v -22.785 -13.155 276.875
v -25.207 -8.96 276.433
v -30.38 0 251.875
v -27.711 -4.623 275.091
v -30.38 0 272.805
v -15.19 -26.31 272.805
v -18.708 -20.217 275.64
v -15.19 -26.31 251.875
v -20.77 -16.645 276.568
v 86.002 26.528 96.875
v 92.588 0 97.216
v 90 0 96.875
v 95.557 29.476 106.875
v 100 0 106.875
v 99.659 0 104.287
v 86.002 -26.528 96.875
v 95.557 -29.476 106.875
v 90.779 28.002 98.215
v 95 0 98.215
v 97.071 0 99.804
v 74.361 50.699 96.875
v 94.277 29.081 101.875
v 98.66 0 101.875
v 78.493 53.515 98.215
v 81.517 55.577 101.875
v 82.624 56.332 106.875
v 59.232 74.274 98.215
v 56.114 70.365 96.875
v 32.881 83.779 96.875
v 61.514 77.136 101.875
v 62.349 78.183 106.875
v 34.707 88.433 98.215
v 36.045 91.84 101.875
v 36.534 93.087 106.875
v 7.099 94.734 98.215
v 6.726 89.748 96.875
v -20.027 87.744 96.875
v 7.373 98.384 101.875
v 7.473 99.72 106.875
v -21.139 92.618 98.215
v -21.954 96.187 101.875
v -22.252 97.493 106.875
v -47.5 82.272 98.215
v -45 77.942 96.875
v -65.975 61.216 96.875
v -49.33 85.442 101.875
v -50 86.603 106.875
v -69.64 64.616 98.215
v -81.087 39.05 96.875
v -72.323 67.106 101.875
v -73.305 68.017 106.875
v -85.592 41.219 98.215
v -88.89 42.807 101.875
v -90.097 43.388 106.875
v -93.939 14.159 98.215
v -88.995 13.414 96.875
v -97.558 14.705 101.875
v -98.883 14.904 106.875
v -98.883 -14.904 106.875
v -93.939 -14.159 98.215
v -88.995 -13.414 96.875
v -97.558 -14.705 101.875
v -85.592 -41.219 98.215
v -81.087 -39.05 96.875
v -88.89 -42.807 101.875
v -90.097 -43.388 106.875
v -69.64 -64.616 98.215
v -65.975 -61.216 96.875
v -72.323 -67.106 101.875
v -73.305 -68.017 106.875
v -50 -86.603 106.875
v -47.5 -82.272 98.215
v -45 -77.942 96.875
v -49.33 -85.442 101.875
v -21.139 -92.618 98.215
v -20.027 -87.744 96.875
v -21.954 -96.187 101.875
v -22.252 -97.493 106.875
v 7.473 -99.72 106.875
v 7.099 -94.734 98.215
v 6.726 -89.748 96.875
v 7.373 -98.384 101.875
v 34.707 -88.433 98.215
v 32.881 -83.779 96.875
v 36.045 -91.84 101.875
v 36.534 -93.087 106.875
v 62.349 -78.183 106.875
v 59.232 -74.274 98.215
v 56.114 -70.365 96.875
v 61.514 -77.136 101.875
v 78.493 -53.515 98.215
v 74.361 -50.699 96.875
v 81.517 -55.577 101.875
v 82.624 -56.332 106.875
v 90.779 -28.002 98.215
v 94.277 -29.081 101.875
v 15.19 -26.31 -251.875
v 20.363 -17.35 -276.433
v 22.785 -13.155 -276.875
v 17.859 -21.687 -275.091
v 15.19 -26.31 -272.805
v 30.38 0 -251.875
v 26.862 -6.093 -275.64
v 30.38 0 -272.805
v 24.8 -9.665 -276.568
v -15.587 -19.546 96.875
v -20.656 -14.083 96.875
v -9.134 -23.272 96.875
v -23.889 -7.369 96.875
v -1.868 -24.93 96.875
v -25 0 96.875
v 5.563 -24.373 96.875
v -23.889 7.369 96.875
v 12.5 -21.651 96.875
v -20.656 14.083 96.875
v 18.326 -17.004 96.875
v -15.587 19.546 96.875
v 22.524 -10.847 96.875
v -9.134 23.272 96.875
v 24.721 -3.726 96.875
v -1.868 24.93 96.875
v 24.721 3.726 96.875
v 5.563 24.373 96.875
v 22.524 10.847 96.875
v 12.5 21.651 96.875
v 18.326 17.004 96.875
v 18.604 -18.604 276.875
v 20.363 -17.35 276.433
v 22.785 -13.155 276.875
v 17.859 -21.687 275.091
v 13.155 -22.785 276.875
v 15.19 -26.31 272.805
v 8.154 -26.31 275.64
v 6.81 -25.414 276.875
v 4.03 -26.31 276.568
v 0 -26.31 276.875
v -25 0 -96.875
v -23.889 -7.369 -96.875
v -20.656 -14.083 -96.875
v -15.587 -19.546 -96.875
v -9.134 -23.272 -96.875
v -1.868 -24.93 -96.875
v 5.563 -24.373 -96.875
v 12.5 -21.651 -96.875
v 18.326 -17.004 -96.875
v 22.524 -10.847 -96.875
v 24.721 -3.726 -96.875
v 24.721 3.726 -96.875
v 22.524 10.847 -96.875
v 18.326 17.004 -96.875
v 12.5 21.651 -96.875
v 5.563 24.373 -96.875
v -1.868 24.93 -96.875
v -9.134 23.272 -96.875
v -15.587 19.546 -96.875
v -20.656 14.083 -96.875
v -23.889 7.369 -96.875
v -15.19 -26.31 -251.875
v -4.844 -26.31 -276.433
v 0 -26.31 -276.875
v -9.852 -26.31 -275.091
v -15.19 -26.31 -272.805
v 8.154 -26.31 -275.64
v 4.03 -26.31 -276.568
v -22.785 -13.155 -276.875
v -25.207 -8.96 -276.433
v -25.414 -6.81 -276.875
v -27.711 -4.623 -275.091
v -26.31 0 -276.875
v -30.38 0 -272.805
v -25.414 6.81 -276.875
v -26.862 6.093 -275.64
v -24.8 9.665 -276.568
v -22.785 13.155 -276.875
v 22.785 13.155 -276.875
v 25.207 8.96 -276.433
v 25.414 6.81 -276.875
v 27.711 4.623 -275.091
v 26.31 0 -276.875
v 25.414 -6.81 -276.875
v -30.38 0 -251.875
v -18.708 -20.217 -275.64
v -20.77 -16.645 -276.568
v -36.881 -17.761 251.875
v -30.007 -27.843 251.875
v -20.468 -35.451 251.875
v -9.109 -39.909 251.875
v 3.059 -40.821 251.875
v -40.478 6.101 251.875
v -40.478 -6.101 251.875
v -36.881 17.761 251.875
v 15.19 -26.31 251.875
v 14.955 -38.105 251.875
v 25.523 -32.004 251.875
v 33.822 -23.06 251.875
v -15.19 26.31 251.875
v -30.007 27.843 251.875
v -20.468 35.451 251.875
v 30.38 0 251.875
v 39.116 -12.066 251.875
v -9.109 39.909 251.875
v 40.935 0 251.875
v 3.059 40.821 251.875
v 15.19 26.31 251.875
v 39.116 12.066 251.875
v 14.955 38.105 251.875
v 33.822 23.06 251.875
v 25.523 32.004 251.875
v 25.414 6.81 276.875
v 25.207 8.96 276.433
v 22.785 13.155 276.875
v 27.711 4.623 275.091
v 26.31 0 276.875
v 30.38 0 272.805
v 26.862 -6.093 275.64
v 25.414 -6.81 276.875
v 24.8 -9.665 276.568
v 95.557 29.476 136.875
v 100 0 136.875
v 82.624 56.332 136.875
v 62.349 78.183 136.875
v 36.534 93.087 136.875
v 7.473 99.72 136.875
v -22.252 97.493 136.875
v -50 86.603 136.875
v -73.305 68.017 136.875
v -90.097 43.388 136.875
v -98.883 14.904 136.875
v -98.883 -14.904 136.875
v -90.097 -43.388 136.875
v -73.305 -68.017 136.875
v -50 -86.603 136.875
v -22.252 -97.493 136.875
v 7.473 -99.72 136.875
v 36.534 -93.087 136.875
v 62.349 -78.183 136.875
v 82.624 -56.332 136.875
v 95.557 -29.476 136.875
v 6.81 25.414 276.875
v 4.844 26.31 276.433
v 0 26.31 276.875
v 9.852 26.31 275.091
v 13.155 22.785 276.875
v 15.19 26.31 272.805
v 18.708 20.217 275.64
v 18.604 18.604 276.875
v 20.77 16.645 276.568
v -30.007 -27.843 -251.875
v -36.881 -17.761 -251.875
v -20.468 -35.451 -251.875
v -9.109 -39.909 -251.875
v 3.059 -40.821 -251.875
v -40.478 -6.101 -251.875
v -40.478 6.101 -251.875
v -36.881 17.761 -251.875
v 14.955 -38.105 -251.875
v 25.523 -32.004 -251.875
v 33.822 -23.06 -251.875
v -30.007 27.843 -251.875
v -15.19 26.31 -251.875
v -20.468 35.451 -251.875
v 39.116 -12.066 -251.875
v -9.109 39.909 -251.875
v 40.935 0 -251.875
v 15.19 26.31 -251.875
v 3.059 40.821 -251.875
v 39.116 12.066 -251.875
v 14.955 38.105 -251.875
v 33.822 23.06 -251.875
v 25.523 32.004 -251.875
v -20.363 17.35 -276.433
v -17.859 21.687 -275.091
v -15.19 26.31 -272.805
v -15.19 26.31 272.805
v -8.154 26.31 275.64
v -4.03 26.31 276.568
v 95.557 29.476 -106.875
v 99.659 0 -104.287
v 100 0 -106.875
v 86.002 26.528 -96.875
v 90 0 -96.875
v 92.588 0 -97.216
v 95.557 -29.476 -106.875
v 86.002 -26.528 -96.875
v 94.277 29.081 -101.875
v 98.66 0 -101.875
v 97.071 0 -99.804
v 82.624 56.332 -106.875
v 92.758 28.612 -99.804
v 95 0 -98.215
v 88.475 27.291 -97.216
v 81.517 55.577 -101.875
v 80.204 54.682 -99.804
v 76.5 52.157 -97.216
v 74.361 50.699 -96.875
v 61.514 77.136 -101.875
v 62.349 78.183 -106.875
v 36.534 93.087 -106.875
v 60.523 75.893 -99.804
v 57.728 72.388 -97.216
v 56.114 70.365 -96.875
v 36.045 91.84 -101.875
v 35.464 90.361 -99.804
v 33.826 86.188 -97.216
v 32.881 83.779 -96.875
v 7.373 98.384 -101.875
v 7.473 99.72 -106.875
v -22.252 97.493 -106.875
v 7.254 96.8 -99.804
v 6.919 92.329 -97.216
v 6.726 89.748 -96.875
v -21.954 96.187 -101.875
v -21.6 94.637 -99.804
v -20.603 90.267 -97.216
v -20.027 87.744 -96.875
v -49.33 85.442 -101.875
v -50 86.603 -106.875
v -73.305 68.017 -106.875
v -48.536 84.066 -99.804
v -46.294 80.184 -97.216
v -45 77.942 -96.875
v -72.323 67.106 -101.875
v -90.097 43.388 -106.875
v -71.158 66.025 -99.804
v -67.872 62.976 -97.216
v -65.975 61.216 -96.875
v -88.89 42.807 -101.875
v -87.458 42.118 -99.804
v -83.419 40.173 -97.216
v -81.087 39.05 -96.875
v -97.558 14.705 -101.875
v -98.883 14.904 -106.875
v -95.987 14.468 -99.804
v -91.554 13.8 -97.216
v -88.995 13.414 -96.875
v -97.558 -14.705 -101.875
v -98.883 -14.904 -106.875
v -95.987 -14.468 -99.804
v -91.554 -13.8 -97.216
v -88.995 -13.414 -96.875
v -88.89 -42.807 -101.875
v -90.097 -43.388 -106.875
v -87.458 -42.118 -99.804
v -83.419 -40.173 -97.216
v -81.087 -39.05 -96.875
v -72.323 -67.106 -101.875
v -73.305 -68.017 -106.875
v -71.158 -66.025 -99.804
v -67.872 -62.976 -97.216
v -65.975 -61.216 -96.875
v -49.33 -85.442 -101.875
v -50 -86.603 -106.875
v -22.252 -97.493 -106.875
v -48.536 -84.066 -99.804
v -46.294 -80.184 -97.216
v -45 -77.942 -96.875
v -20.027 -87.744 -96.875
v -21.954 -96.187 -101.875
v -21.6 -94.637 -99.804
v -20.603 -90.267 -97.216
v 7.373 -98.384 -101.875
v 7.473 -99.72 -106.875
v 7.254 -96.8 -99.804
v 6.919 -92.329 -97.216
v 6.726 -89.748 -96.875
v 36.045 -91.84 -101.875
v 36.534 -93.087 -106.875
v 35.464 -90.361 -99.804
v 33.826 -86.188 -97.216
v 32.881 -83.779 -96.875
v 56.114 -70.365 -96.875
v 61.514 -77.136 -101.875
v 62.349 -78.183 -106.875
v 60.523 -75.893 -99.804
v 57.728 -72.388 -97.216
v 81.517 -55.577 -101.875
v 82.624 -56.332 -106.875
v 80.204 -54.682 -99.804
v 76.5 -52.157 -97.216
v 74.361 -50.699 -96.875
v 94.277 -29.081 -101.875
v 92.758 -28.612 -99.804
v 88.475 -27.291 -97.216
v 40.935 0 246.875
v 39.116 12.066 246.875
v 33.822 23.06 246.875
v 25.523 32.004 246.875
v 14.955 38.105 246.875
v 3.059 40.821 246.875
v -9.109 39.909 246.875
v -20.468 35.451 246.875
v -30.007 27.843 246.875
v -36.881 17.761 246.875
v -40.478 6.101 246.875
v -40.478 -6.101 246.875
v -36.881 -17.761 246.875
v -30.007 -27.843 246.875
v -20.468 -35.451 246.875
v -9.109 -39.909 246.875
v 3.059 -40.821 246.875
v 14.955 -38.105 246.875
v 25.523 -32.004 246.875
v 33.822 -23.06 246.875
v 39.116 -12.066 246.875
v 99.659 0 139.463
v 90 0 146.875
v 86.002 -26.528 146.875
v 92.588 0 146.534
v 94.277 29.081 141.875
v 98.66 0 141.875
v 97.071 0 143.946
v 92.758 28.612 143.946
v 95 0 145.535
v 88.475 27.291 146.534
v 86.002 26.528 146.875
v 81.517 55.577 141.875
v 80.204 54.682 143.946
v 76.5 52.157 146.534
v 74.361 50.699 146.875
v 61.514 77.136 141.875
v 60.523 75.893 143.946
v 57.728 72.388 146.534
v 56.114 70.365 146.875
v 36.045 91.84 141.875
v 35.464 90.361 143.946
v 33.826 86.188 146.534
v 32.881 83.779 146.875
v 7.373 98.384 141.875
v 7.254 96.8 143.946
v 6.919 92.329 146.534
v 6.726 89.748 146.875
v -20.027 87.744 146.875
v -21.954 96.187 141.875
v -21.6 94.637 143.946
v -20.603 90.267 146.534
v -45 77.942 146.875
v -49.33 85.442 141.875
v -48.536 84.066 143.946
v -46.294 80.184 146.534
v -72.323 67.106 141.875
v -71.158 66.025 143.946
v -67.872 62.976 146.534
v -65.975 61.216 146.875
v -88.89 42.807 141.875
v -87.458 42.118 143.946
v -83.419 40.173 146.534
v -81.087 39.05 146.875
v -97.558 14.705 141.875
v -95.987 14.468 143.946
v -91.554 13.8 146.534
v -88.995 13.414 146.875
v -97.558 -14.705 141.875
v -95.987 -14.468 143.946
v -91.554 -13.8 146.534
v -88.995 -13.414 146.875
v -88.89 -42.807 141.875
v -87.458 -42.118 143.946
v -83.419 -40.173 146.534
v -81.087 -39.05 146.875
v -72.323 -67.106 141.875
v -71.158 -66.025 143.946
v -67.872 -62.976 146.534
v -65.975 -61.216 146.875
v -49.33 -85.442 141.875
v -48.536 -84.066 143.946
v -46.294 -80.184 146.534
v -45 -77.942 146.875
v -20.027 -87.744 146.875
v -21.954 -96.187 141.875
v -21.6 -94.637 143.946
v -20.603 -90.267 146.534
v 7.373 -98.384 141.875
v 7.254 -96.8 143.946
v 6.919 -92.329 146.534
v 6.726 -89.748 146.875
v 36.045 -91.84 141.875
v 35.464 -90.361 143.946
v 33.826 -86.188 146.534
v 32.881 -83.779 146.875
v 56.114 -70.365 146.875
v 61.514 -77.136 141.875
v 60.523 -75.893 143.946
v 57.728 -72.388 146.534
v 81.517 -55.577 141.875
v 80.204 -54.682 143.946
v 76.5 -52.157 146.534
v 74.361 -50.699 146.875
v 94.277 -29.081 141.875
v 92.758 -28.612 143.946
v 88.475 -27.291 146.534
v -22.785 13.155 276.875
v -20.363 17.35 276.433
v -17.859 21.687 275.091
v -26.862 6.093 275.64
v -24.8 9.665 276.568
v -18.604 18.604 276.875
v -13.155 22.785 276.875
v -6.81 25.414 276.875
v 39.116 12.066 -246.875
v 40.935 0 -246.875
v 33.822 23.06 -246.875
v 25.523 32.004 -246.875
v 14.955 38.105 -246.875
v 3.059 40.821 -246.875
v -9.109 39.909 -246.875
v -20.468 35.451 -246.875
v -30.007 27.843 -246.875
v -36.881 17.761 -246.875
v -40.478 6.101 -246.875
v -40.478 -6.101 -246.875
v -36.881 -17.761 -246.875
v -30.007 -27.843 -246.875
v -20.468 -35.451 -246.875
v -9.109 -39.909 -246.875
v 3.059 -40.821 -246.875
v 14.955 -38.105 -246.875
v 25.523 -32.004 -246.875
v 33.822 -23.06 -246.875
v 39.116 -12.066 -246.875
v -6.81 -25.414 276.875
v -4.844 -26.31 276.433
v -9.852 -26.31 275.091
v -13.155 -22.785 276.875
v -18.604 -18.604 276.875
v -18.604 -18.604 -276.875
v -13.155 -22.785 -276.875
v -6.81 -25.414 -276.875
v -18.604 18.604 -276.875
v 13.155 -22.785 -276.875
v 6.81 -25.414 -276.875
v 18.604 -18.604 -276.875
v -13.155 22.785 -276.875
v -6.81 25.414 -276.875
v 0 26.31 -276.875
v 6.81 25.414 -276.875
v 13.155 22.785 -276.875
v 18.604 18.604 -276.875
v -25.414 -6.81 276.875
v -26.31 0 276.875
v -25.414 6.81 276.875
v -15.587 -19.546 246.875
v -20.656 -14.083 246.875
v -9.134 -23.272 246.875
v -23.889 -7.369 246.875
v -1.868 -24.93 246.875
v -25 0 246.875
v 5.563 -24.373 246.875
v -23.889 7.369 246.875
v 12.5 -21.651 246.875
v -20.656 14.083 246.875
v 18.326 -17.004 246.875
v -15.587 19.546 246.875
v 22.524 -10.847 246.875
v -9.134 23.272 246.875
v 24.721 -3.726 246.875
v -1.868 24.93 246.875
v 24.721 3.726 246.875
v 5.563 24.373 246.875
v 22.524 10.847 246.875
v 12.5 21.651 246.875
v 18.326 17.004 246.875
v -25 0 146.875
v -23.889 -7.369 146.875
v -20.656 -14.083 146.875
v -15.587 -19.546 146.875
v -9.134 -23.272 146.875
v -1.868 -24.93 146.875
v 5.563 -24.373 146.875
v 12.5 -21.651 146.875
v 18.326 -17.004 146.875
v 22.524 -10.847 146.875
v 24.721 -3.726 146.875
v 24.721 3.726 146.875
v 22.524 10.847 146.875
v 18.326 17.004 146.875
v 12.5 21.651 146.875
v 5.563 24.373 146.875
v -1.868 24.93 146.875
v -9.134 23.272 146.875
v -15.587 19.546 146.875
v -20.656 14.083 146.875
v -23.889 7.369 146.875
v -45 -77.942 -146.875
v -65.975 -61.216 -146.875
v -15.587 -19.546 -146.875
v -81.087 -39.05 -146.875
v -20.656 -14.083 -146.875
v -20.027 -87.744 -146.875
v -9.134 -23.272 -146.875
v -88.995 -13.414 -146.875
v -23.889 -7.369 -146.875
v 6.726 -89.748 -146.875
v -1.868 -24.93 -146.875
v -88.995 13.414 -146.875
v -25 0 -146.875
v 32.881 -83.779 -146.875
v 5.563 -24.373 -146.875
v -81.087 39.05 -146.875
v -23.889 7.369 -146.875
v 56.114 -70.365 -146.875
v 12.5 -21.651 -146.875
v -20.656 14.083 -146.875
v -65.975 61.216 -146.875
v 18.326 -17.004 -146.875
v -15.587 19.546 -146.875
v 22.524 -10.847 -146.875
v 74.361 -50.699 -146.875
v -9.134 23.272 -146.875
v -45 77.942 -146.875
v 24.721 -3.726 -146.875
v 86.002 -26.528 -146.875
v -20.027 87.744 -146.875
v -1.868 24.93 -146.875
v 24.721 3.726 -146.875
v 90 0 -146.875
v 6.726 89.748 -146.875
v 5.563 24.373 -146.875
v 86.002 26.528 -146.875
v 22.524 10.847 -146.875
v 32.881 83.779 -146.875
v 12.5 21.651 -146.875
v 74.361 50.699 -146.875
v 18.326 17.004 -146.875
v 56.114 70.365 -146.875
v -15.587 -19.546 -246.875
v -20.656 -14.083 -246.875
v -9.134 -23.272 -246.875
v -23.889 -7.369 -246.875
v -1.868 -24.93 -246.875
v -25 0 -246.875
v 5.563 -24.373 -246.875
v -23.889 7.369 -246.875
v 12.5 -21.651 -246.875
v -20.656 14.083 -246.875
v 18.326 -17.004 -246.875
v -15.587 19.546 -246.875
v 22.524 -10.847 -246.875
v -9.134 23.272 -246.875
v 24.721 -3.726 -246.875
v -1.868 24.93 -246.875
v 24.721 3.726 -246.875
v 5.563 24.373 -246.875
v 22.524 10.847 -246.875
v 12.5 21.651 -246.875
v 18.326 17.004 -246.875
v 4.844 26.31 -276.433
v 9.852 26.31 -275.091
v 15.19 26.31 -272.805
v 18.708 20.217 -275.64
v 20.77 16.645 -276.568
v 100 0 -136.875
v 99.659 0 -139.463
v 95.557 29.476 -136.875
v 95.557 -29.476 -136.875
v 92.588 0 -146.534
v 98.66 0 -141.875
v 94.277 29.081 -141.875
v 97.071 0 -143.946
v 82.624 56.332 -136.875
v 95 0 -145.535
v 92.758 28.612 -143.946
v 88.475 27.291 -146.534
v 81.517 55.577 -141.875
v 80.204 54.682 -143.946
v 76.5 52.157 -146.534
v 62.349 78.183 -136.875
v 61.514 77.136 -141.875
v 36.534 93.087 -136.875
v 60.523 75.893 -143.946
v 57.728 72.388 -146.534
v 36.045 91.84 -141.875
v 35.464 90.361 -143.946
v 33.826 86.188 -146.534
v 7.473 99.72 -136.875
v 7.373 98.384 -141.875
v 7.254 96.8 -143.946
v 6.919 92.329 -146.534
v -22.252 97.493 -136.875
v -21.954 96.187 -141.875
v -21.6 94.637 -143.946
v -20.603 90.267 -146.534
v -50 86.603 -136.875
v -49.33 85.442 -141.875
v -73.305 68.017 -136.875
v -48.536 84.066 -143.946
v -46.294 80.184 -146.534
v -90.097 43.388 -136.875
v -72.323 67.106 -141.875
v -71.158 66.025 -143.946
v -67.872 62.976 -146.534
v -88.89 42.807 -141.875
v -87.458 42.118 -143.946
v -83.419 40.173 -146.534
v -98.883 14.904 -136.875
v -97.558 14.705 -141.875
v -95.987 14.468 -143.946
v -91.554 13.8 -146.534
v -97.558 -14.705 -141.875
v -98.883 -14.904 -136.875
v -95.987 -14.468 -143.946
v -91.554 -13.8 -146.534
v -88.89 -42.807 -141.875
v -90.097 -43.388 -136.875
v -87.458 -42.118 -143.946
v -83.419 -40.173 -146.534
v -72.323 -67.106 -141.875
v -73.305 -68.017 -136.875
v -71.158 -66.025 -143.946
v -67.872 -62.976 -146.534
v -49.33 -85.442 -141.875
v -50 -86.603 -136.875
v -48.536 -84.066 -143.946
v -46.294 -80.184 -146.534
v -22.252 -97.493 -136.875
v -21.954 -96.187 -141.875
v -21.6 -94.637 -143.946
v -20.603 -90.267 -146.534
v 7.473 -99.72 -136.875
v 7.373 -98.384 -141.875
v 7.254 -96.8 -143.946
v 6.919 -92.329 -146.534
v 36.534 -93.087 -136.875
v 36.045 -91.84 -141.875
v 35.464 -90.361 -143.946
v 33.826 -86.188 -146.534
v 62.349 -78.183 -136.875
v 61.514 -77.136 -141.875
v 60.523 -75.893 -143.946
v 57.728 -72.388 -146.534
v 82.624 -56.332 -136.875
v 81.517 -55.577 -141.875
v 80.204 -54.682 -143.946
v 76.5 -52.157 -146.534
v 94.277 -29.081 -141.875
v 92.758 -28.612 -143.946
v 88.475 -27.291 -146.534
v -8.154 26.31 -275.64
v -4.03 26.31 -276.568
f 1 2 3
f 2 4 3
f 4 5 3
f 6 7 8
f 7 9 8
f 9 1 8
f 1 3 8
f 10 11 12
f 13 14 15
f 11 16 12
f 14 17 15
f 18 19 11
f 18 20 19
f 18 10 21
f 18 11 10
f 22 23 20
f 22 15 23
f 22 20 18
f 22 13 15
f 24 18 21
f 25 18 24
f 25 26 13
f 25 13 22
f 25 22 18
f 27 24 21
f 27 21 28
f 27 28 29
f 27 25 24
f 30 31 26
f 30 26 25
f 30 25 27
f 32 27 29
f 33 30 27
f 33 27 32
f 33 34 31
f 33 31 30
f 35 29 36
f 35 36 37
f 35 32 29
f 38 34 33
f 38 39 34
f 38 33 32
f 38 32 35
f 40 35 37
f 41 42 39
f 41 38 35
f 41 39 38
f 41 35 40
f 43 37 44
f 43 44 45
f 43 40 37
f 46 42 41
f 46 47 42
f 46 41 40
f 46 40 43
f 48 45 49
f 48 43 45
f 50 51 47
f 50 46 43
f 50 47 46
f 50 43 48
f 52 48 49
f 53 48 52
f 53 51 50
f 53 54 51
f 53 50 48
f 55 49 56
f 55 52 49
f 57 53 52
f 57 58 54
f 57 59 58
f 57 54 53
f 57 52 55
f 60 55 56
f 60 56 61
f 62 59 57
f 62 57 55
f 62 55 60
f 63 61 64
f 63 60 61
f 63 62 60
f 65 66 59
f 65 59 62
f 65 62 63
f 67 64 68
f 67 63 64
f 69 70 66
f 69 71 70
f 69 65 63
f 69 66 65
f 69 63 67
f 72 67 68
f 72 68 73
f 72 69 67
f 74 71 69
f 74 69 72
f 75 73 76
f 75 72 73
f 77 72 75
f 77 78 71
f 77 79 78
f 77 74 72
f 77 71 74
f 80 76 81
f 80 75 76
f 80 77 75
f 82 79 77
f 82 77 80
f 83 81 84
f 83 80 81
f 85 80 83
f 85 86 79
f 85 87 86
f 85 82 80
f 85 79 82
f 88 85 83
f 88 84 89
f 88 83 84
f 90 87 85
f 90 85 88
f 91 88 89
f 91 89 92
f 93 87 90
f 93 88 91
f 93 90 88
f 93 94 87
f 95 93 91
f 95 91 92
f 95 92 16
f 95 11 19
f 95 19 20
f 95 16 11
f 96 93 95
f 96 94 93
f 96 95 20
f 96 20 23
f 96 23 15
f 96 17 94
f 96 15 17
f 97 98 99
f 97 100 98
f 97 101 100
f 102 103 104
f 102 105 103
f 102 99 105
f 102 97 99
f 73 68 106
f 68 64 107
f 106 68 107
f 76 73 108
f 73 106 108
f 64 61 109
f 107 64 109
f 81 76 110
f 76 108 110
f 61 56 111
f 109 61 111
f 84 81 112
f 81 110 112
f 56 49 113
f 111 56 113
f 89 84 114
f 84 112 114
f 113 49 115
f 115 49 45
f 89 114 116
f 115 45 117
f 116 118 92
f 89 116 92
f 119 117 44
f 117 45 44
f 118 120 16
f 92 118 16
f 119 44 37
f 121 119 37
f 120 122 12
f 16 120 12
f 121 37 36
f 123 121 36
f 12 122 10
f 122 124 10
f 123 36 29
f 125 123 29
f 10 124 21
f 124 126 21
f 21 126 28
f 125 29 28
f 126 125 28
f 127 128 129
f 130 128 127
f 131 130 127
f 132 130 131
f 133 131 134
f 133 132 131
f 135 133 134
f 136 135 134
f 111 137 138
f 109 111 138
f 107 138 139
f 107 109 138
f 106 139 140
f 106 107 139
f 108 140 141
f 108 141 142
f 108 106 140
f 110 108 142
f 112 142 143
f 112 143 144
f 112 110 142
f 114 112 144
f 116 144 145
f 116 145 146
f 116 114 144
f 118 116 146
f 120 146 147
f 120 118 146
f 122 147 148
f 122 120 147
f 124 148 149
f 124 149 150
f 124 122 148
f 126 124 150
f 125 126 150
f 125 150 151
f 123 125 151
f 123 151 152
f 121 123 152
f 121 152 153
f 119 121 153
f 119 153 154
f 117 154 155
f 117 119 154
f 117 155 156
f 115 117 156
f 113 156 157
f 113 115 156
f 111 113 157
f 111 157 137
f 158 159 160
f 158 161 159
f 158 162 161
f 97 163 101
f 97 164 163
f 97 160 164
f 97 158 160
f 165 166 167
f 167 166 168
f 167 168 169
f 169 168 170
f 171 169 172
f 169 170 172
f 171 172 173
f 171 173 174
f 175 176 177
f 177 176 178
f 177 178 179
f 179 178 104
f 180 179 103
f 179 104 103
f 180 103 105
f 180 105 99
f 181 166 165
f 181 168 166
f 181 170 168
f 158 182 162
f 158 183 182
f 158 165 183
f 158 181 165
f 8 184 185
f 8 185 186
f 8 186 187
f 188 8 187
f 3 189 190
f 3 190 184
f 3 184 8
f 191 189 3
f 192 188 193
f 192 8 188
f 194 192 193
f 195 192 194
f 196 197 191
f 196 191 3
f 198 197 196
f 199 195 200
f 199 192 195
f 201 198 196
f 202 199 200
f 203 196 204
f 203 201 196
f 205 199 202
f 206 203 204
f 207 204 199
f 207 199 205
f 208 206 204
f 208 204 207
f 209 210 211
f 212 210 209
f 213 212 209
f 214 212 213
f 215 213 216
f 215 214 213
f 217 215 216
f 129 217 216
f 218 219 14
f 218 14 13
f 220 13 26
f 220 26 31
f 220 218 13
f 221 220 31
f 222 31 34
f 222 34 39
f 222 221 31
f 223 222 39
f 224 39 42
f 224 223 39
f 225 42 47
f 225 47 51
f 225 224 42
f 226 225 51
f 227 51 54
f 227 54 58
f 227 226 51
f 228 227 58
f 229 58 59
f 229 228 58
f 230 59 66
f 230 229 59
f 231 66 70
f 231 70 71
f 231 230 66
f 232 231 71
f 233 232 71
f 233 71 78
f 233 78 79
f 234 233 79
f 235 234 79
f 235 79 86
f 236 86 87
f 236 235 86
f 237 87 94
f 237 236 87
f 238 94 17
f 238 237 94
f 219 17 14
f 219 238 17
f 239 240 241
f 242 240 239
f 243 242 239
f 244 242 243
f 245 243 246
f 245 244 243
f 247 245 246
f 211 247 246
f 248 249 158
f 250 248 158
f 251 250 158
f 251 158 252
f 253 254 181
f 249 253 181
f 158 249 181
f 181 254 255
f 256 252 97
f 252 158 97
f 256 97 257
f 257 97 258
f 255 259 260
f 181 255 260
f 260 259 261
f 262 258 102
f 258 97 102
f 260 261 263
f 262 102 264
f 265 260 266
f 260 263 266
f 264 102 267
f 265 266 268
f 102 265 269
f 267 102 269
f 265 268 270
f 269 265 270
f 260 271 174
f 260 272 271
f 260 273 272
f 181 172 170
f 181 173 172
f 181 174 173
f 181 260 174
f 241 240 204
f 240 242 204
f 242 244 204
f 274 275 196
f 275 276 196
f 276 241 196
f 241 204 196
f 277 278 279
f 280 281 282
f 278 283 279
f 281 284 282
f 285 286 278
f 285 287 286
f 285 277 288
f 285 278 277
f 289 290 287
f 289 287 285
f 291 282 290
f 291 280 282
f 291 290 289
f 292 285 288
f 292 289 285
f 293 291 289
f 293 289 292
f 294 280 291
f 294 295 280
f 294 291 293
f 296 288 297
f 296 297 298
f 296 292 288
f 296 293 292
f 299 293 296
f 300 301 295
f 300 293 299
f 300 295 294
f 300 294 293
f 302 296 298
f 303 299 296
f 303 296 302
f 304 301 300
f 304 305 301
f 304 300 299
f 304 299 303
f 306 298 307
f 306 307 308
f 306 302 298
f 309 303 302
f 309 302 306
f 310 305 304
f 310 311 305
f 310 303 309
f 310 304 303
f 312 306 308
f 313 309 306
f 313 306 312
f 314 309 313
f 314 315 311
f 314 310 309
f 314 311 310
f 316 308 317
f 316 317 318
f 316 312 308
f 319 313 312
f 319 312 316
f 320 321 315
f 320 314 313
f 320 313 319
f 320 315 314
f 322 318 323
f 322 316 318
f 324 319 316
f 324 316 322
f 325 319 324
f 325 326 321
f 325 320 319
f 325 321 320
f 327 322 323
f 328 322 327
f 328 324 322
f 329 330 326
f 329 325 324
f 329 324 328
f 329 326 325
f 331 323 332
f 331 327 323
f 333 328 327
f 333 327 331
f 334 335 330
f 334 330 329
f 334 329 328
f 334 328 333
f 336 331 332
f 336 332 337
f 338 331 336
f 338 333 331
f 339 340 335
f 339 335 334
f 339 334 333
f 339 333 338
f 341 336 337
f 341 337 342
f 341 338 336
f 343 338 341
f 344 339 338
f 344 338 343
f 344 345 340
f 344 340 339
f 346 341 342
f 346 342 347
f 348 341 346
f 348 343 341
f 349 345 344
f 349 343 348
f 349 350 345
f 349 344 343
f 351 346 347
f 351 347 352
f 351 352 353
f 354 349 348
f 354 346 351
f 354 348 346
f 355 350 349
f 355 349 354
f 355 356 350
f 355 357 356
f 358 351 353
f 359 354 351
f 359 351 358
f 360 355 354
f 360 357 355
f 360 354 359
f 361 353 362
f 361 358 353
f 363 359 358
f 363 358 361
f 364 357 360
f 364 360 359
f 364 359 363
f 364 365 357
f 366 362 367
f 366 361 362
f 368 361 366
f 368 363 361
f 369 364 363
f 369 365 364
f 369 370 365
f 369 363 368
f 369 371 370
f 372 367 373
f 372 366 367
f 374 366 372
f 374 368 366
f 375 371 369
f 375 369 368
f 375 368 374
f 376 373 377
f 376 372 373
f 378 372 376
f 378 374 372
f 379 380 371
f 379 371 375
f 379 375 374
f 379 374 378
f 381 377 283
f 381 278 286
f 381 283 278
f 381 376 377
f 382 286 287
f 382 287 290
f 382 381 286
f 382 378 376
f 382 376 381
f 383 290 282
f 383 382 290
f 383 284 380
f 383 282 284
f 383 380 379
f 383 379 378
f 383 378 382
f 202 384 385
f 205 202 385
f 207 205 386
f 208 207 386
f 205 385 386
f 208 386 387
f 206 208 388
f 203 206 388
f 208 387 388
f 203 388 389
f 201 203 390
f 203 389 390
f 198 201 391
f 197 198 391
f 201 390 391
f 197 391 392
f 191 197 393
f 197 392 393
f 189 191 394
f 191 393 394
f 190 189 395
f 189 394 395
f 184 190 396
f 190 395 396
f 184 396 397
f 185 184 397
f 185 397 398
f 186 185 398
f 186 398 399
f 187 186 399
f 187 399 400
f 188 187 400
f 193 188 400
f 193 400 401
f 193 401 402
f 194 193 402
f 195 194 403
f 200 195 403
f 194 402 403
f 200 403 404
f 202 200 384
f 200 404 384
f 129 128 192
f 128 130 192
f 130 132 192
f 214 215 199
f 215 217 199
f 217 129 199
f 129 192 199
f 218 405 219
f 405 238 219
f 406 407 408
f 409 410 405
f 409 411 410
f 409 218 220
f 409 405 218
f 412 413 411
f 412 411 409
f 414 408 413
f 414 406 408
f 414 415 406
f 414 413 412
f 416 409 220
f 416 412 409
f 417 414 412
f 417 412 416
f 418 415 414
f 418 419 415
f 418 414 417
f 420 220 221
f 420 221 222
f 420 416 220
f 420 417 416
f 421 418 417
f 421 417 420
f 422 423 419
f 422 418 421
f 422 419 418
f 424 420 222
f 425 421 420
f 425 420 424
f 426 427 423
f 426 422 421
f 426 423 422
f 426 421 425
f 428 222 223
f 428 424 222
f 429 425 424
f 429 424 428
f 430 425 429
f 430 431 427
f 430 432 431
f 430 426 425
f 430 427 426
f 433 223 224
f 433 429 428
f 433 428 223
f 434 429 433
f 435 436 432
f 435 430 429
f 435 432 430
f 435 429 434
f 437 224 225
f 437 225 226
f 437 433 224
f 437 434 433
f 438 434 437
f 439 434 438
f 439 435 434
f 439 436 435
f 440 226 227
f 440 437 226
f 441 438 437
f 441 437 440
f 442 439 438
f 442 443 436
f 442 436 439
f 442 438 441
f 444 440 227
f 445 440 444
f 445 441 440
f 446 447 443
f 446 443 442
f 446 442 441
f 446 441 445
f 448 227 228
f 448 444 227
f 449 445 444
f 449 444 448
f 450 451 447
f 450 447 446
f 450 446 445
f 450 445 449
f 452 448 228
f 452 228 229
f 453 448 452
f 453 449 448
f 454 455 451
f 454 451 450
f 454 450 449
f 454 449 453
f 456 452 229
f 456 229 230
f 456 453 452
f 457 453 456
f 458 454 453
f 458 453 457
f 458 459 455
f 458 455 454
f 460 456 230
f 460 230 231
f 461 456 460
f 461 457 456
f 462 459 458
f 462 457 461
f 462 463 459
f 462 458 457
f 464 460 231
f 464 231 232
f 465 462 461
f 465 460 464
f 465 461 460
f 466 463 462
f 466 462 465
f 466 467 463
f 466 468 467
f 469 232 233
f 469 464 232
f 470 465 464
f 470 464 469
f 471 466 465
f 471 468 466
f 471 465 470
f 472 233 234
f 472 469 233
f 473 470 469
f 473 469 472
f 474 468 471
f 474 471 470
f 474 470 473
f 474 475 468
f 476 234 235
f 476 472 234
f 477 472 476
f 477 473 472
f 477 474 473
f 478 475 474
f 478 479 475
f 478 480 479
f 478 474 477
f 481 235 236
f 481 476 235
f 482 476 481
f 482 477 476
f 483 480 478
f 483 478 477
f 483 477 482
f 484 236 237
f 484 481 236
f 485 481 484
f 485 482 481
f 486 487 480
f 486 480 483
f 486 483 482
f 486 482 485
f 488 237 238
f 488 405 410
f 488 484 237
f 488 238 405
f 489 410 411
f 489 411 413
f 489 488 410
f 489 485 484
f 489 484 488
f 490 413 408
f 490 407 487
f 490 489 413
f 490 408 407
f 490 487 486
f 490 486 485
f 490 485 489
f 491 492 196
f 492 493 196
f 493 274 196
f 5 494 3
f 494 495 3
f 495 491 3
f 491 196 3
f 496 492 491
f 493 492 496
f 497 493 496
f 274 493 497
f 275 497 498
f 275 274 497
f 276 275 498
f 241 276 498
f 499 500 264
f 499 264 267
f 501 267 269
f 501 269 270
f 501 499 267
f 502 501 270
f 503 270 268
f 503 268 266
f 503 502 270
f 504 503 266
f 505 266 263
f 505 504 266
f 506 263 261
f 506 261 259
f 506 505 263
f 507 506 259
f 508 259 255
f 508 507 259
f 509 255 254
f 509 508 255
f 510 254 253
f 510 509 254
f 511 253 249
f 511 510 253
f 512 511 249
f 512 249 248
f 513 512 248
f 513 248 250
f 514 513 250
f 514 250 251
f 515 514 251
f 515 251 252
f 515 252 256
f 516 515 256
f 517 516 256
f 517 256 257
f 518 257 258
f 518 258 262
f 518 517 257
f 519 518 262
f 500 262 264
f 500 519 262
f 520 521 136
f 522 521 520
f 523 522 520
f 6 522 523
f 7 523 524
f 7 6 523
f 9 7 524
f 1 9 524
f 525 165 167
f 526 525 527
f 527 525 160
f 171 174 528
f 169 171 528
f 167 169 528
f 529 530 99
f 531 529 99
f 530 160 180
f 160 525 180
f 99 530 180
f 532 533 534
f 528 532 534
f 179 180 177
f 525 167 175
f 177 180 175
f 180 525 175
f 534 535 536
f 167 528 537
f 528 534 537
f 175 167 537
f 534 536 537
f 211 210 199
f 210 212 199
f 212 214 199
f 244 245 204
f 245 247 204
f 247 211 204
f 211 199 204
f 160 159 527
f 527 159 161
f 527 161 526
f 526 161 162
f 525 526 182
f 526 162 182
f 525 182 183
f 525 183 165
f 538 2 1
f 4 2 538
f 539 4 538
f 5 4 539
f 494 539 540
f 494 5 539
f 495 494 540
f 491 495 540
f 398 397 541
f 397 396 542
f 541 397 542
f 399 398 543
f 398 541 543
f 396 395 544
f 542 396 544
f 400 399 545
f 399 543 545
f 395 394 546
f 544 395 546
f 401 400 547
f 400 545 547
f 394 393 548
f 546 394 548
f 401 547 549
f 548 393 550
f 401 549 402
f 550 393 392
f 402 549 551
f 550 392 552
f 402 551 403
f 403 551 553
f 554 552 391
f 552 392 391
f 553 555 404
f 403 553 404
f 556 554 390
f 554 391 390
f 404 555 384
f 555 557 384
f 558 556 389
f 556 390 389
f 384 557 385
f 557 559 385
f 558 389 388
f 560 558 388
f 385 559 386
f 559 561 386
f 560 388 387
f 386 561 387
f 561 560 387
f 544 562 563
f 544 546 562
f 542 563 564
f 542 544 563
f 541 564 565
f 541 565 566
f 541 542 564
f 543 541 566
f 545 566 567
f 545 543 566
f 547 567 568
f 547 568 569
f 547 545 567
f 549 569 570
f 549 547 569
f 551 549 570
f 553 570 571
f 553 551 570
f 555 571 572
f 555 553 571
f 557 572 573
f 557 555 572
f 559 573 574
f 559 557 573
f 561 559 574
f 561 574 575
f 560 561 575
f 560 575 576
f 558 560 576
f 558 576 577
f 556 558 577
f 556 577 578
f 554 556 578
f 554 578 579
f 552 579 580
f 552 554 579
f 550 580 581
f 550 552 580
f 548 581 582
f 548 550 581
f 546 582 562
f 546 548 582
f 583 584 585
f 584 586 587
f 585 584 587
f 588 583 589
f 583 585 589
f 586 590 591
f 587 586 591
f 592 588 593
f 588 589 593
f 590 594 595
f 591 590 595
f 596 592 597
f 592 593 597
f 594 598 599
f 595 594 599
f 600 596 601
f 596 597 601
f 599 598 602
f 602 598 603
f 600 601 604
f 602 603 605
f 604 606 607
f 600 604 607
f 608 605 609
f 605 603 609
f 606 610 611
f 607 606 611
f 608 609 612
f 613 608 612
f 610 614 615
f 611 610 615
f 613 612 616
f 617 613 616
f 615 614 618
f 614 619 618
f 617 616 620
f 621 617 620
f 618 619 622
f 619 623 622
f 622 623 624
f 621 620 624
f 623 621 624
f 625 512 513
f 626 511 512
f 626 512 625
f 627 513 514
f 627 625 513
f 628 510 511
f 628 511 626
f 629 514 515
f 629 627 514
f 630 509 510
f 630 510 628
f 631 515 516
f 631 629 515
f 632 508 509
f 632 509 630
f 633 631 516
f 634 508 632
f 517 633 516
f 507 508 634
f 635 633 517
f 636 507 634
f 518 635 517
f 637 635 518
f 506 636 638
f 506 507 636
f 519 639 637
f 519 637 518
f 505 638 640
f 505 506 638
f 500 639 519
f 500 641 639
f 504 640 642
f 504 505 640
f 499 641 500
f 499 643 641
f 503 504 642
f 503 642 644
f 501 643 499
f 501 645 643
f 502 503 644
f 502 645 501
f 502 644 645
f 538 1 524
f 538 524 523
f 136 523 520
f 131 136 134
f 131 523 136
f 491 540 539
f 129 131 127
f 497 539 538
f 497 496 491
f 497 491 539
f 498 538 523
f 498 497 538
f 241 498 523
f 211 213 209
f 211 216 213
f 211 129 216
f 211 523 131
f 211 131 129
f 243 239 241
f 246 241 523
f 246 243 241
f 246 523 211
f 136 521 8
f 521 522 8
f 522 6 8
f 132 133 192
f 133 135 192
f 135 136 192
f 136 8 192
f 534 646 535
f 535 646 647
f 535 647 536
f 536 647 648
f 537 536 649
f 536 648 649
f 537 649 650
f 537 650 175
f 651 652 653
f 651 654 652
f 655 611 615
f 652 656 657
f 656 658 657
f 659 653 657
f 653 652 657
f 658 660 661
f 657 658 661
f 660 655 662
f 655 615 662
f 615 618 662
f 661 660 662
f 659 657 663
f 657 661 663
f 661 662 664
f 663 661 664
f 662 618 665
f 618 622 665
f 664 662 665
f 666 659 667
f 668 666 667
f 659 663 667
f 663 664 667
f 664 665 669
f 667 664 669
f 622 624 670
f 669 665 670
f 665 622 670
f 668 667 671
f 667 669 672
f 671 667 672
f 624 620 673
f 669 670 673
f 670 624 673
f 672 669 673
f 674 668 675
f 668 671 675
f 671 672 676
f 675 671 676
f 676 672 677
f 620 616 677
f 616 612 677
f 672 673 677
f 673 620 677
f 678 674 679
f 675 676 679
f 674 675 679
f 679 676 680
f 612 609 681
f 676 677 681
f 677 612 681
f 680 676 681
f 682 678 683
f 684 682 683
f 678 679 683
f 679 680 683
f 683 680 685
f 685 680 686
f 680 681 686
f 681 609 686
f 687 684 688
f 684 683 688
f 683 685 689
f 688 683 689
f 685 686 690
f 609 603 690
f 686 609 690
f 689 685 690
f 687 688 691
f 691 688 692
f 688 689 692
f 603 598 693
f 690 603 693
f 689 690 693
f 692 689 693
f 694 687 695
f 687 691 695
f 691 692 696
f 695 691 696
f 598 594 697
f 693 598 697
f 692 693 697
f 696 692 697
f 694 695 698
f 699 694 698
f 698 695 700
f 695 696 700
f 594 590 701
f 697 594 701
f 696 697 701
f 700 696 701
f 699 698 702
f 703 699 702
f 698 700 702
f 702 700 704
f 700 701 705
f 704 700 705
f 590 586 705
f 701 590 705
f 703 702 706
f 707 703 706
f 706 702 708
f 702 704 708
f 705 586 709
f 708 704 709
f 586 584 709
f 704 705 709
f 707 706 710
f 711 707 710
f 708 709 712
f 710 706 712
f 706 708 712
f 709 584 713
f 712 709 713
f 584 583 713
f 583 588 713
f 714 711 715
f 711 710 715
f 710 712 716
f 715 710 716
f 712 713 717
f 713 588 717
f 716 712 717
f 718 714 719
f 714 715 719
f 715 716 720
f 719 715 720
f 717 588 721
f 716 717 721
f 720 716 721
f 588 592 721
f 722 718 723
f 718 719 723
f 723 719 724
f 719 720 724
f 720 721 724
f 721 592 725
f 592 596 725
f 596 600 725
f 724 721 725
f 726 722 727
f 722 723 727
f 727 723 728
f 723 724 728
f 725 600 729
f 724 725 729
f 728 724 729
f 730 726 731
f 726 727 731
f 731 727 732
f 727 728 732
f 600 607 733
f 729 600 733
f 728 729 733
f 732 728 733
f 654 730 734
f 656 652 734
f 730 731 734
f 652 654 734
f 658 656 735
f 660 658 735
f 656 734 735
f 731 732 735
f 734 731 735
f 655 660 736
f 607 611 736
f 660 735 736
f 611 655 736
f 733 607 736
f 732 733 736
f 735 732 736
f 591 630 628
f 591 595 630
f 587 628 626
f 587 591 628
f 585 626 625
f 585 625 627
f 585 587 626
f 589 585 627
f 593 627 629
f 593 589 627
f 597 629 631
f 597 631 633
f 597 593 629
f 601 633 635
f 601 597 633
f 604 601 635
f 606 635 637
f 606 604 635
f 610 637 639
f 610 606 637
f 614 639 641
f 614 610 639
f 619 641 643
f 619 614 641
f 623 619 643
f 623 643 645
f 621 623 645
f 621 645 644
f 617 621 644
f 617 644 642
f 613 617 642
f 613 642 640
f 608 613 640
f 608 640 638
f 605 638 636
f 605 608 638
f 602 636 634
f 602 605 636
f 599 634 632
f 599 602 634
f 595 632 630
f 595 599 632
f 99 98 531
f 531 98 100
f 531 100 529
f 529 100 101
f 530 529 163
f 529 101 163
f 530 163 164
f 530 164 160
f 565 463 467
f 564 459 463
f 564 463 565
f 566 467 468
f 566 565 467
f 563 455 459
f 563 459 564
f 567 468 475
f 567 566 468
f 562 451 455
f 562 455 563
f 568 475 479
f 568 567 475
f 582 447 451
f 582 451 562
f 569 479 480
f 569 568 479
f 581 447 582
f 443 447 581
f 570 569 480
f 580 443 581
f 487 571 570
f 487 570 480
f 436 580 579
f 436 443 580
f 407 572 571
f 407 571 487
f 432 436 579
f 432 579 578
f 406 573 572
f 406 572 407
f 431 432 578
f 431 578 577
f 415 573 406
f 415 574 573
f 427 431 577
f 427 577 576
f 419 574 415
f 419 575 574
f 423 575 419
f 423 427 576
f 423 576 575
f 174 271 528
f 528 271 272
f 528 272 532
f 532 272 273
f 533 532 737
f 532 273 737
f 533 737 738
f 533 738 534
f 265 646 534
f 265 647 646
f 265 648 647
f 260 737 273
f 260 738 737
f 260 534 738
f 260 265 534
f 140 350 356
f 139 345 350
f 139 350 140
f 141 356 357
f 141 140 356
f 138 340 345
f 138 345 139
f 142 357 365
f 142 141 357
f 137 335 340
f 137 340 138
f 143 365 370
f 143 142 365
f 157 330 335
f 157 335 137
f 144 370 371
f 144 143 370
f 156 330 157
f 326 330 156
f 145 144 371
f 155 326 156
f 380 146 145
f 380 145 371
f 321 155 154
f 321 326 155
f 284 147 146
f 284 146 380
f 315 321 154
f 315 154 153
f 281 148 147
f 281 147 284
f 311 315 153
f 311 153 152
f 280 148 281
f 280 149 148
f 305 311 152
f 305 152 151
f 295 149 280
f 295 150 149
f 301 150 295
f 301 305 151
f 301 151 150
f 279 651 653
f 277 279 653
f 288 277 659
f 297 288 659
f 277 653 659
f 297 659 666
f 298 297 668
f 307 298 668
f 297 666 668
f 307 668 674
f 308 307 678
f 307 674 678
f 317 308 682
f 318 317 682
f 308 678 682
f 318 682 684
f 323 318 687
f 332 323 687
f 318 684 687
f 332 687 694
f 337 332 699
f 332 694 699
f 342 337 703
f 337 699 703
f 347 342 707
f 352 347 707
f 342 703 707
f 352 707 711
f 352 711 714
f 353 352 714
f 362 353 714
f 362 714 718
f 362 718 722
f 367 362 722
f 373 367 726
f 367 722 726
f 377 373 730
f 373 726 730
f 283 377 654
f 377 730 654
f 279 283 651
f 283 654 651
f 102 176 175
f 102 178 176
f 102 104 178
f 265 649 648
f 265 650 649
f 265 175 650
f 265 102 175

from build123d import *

# Parameters (mm, degrees)
SKETCH1_R           = 25
BOSS_EXTRUDE1_DEPTH = 246.875
SKETCH2_R           = 100
BOSS_EXTRUDE2_DEPTH = 50
FILLET1_R           = 10
SKETCH3_R           = 40.935
BOSS_EXTRUDE3_DEPTH = 5
BOSS_EXTRUDE4_DEPTH = 25
SKETCH5_R           = 34.808926318
SKETCH5_R_2         = 26.31
CUT_EXTRUDE1_DEPTH  = 25
CUT_EXTRUDE1_TAPER  = 45


with BuildPart() as part:
    # Sketch1 → Boss-Extrude1 (new, symmetric)
    with BuildSketch(Plane.XY):
        with Locations(Location((0, 0, 0), (0, 0, 180))):
            Circle(SKETCH1_R)
    extrude(amount=BOSS_EXTRUDE1_DEPTH, both=True)

    # Sketch2 → Boss-Extrude2 (add)
    with BuildSketch(Plane.XY.offset(146.875)):
        Circle(SKETCH2_R)
    boss_extrude2 = extrude(amount=-BOSS_EXTRUDE2_DEPTH)

    # Mirror1: Boss-Extrude2 across plane
    add(boss_extrude2.mirror(Plane.XY))

    # Fillet1
    fillet1_edges = [part.edges().sort_by_distance(p)[0] for p in [
        (-100, 0, -146.875),
        (-100, 0, -96.875),
        (-100, 0, 96.875),
        (-100, 0, 146.875),
    ]]
    fillet(fillet1_edges, radius=FILLET1_R)

    # Sketch3 → Boss-Extrude3 (add)
    with BuildSketch(Plane.XY.offset(246.875)):
        Circle(SKETCH3_R)
    boss_extrude3 = extrude(amount=BOSS_EXTRUDE3_DEPTH)

    # Sketch4 → Boss-Extrude4 (add)
    with BuildSketch(Plane.XY.offset(251.875)):
        Polygon((-30.380171165, 0), (-15.190085582, -26.31), (15.190085582, -26.31), (30.380171165, 0), (15.190085582, 26.31), (-15.190085582, 26.31), align=None)
    boss_extrude4 = extrude(amount=BOSS_EXTRUDE4_DEPTH)

    # Sketch5 → Cut-Extrude1 (cut)
    with BuildSketch(Plane.XY.offset(276.875)):
        Circle(SKETCH5_R)
        Circle(SKETCH5_R_2, mode=Mode.SUBTRACT)
    cut_extrude1 = extrude(amount=-CUT_EXTRUDE1_DEPTH, taper=CUT_EXTRUDE1_TAPER, mode=Mode.SUBTRACT)

    # Mirror2: Boss-Extrude3, Boss-Extrude4, Cut-Extrude1 across plane
    add(boss_extrude3.mirror(Plane.XY))
    add(boss_extrude4.mirror(Plane.XY))
    add(cut_extrude1.mirror(Plane.XY), mode=Mode.SUBTRACT)


solid = part.part
